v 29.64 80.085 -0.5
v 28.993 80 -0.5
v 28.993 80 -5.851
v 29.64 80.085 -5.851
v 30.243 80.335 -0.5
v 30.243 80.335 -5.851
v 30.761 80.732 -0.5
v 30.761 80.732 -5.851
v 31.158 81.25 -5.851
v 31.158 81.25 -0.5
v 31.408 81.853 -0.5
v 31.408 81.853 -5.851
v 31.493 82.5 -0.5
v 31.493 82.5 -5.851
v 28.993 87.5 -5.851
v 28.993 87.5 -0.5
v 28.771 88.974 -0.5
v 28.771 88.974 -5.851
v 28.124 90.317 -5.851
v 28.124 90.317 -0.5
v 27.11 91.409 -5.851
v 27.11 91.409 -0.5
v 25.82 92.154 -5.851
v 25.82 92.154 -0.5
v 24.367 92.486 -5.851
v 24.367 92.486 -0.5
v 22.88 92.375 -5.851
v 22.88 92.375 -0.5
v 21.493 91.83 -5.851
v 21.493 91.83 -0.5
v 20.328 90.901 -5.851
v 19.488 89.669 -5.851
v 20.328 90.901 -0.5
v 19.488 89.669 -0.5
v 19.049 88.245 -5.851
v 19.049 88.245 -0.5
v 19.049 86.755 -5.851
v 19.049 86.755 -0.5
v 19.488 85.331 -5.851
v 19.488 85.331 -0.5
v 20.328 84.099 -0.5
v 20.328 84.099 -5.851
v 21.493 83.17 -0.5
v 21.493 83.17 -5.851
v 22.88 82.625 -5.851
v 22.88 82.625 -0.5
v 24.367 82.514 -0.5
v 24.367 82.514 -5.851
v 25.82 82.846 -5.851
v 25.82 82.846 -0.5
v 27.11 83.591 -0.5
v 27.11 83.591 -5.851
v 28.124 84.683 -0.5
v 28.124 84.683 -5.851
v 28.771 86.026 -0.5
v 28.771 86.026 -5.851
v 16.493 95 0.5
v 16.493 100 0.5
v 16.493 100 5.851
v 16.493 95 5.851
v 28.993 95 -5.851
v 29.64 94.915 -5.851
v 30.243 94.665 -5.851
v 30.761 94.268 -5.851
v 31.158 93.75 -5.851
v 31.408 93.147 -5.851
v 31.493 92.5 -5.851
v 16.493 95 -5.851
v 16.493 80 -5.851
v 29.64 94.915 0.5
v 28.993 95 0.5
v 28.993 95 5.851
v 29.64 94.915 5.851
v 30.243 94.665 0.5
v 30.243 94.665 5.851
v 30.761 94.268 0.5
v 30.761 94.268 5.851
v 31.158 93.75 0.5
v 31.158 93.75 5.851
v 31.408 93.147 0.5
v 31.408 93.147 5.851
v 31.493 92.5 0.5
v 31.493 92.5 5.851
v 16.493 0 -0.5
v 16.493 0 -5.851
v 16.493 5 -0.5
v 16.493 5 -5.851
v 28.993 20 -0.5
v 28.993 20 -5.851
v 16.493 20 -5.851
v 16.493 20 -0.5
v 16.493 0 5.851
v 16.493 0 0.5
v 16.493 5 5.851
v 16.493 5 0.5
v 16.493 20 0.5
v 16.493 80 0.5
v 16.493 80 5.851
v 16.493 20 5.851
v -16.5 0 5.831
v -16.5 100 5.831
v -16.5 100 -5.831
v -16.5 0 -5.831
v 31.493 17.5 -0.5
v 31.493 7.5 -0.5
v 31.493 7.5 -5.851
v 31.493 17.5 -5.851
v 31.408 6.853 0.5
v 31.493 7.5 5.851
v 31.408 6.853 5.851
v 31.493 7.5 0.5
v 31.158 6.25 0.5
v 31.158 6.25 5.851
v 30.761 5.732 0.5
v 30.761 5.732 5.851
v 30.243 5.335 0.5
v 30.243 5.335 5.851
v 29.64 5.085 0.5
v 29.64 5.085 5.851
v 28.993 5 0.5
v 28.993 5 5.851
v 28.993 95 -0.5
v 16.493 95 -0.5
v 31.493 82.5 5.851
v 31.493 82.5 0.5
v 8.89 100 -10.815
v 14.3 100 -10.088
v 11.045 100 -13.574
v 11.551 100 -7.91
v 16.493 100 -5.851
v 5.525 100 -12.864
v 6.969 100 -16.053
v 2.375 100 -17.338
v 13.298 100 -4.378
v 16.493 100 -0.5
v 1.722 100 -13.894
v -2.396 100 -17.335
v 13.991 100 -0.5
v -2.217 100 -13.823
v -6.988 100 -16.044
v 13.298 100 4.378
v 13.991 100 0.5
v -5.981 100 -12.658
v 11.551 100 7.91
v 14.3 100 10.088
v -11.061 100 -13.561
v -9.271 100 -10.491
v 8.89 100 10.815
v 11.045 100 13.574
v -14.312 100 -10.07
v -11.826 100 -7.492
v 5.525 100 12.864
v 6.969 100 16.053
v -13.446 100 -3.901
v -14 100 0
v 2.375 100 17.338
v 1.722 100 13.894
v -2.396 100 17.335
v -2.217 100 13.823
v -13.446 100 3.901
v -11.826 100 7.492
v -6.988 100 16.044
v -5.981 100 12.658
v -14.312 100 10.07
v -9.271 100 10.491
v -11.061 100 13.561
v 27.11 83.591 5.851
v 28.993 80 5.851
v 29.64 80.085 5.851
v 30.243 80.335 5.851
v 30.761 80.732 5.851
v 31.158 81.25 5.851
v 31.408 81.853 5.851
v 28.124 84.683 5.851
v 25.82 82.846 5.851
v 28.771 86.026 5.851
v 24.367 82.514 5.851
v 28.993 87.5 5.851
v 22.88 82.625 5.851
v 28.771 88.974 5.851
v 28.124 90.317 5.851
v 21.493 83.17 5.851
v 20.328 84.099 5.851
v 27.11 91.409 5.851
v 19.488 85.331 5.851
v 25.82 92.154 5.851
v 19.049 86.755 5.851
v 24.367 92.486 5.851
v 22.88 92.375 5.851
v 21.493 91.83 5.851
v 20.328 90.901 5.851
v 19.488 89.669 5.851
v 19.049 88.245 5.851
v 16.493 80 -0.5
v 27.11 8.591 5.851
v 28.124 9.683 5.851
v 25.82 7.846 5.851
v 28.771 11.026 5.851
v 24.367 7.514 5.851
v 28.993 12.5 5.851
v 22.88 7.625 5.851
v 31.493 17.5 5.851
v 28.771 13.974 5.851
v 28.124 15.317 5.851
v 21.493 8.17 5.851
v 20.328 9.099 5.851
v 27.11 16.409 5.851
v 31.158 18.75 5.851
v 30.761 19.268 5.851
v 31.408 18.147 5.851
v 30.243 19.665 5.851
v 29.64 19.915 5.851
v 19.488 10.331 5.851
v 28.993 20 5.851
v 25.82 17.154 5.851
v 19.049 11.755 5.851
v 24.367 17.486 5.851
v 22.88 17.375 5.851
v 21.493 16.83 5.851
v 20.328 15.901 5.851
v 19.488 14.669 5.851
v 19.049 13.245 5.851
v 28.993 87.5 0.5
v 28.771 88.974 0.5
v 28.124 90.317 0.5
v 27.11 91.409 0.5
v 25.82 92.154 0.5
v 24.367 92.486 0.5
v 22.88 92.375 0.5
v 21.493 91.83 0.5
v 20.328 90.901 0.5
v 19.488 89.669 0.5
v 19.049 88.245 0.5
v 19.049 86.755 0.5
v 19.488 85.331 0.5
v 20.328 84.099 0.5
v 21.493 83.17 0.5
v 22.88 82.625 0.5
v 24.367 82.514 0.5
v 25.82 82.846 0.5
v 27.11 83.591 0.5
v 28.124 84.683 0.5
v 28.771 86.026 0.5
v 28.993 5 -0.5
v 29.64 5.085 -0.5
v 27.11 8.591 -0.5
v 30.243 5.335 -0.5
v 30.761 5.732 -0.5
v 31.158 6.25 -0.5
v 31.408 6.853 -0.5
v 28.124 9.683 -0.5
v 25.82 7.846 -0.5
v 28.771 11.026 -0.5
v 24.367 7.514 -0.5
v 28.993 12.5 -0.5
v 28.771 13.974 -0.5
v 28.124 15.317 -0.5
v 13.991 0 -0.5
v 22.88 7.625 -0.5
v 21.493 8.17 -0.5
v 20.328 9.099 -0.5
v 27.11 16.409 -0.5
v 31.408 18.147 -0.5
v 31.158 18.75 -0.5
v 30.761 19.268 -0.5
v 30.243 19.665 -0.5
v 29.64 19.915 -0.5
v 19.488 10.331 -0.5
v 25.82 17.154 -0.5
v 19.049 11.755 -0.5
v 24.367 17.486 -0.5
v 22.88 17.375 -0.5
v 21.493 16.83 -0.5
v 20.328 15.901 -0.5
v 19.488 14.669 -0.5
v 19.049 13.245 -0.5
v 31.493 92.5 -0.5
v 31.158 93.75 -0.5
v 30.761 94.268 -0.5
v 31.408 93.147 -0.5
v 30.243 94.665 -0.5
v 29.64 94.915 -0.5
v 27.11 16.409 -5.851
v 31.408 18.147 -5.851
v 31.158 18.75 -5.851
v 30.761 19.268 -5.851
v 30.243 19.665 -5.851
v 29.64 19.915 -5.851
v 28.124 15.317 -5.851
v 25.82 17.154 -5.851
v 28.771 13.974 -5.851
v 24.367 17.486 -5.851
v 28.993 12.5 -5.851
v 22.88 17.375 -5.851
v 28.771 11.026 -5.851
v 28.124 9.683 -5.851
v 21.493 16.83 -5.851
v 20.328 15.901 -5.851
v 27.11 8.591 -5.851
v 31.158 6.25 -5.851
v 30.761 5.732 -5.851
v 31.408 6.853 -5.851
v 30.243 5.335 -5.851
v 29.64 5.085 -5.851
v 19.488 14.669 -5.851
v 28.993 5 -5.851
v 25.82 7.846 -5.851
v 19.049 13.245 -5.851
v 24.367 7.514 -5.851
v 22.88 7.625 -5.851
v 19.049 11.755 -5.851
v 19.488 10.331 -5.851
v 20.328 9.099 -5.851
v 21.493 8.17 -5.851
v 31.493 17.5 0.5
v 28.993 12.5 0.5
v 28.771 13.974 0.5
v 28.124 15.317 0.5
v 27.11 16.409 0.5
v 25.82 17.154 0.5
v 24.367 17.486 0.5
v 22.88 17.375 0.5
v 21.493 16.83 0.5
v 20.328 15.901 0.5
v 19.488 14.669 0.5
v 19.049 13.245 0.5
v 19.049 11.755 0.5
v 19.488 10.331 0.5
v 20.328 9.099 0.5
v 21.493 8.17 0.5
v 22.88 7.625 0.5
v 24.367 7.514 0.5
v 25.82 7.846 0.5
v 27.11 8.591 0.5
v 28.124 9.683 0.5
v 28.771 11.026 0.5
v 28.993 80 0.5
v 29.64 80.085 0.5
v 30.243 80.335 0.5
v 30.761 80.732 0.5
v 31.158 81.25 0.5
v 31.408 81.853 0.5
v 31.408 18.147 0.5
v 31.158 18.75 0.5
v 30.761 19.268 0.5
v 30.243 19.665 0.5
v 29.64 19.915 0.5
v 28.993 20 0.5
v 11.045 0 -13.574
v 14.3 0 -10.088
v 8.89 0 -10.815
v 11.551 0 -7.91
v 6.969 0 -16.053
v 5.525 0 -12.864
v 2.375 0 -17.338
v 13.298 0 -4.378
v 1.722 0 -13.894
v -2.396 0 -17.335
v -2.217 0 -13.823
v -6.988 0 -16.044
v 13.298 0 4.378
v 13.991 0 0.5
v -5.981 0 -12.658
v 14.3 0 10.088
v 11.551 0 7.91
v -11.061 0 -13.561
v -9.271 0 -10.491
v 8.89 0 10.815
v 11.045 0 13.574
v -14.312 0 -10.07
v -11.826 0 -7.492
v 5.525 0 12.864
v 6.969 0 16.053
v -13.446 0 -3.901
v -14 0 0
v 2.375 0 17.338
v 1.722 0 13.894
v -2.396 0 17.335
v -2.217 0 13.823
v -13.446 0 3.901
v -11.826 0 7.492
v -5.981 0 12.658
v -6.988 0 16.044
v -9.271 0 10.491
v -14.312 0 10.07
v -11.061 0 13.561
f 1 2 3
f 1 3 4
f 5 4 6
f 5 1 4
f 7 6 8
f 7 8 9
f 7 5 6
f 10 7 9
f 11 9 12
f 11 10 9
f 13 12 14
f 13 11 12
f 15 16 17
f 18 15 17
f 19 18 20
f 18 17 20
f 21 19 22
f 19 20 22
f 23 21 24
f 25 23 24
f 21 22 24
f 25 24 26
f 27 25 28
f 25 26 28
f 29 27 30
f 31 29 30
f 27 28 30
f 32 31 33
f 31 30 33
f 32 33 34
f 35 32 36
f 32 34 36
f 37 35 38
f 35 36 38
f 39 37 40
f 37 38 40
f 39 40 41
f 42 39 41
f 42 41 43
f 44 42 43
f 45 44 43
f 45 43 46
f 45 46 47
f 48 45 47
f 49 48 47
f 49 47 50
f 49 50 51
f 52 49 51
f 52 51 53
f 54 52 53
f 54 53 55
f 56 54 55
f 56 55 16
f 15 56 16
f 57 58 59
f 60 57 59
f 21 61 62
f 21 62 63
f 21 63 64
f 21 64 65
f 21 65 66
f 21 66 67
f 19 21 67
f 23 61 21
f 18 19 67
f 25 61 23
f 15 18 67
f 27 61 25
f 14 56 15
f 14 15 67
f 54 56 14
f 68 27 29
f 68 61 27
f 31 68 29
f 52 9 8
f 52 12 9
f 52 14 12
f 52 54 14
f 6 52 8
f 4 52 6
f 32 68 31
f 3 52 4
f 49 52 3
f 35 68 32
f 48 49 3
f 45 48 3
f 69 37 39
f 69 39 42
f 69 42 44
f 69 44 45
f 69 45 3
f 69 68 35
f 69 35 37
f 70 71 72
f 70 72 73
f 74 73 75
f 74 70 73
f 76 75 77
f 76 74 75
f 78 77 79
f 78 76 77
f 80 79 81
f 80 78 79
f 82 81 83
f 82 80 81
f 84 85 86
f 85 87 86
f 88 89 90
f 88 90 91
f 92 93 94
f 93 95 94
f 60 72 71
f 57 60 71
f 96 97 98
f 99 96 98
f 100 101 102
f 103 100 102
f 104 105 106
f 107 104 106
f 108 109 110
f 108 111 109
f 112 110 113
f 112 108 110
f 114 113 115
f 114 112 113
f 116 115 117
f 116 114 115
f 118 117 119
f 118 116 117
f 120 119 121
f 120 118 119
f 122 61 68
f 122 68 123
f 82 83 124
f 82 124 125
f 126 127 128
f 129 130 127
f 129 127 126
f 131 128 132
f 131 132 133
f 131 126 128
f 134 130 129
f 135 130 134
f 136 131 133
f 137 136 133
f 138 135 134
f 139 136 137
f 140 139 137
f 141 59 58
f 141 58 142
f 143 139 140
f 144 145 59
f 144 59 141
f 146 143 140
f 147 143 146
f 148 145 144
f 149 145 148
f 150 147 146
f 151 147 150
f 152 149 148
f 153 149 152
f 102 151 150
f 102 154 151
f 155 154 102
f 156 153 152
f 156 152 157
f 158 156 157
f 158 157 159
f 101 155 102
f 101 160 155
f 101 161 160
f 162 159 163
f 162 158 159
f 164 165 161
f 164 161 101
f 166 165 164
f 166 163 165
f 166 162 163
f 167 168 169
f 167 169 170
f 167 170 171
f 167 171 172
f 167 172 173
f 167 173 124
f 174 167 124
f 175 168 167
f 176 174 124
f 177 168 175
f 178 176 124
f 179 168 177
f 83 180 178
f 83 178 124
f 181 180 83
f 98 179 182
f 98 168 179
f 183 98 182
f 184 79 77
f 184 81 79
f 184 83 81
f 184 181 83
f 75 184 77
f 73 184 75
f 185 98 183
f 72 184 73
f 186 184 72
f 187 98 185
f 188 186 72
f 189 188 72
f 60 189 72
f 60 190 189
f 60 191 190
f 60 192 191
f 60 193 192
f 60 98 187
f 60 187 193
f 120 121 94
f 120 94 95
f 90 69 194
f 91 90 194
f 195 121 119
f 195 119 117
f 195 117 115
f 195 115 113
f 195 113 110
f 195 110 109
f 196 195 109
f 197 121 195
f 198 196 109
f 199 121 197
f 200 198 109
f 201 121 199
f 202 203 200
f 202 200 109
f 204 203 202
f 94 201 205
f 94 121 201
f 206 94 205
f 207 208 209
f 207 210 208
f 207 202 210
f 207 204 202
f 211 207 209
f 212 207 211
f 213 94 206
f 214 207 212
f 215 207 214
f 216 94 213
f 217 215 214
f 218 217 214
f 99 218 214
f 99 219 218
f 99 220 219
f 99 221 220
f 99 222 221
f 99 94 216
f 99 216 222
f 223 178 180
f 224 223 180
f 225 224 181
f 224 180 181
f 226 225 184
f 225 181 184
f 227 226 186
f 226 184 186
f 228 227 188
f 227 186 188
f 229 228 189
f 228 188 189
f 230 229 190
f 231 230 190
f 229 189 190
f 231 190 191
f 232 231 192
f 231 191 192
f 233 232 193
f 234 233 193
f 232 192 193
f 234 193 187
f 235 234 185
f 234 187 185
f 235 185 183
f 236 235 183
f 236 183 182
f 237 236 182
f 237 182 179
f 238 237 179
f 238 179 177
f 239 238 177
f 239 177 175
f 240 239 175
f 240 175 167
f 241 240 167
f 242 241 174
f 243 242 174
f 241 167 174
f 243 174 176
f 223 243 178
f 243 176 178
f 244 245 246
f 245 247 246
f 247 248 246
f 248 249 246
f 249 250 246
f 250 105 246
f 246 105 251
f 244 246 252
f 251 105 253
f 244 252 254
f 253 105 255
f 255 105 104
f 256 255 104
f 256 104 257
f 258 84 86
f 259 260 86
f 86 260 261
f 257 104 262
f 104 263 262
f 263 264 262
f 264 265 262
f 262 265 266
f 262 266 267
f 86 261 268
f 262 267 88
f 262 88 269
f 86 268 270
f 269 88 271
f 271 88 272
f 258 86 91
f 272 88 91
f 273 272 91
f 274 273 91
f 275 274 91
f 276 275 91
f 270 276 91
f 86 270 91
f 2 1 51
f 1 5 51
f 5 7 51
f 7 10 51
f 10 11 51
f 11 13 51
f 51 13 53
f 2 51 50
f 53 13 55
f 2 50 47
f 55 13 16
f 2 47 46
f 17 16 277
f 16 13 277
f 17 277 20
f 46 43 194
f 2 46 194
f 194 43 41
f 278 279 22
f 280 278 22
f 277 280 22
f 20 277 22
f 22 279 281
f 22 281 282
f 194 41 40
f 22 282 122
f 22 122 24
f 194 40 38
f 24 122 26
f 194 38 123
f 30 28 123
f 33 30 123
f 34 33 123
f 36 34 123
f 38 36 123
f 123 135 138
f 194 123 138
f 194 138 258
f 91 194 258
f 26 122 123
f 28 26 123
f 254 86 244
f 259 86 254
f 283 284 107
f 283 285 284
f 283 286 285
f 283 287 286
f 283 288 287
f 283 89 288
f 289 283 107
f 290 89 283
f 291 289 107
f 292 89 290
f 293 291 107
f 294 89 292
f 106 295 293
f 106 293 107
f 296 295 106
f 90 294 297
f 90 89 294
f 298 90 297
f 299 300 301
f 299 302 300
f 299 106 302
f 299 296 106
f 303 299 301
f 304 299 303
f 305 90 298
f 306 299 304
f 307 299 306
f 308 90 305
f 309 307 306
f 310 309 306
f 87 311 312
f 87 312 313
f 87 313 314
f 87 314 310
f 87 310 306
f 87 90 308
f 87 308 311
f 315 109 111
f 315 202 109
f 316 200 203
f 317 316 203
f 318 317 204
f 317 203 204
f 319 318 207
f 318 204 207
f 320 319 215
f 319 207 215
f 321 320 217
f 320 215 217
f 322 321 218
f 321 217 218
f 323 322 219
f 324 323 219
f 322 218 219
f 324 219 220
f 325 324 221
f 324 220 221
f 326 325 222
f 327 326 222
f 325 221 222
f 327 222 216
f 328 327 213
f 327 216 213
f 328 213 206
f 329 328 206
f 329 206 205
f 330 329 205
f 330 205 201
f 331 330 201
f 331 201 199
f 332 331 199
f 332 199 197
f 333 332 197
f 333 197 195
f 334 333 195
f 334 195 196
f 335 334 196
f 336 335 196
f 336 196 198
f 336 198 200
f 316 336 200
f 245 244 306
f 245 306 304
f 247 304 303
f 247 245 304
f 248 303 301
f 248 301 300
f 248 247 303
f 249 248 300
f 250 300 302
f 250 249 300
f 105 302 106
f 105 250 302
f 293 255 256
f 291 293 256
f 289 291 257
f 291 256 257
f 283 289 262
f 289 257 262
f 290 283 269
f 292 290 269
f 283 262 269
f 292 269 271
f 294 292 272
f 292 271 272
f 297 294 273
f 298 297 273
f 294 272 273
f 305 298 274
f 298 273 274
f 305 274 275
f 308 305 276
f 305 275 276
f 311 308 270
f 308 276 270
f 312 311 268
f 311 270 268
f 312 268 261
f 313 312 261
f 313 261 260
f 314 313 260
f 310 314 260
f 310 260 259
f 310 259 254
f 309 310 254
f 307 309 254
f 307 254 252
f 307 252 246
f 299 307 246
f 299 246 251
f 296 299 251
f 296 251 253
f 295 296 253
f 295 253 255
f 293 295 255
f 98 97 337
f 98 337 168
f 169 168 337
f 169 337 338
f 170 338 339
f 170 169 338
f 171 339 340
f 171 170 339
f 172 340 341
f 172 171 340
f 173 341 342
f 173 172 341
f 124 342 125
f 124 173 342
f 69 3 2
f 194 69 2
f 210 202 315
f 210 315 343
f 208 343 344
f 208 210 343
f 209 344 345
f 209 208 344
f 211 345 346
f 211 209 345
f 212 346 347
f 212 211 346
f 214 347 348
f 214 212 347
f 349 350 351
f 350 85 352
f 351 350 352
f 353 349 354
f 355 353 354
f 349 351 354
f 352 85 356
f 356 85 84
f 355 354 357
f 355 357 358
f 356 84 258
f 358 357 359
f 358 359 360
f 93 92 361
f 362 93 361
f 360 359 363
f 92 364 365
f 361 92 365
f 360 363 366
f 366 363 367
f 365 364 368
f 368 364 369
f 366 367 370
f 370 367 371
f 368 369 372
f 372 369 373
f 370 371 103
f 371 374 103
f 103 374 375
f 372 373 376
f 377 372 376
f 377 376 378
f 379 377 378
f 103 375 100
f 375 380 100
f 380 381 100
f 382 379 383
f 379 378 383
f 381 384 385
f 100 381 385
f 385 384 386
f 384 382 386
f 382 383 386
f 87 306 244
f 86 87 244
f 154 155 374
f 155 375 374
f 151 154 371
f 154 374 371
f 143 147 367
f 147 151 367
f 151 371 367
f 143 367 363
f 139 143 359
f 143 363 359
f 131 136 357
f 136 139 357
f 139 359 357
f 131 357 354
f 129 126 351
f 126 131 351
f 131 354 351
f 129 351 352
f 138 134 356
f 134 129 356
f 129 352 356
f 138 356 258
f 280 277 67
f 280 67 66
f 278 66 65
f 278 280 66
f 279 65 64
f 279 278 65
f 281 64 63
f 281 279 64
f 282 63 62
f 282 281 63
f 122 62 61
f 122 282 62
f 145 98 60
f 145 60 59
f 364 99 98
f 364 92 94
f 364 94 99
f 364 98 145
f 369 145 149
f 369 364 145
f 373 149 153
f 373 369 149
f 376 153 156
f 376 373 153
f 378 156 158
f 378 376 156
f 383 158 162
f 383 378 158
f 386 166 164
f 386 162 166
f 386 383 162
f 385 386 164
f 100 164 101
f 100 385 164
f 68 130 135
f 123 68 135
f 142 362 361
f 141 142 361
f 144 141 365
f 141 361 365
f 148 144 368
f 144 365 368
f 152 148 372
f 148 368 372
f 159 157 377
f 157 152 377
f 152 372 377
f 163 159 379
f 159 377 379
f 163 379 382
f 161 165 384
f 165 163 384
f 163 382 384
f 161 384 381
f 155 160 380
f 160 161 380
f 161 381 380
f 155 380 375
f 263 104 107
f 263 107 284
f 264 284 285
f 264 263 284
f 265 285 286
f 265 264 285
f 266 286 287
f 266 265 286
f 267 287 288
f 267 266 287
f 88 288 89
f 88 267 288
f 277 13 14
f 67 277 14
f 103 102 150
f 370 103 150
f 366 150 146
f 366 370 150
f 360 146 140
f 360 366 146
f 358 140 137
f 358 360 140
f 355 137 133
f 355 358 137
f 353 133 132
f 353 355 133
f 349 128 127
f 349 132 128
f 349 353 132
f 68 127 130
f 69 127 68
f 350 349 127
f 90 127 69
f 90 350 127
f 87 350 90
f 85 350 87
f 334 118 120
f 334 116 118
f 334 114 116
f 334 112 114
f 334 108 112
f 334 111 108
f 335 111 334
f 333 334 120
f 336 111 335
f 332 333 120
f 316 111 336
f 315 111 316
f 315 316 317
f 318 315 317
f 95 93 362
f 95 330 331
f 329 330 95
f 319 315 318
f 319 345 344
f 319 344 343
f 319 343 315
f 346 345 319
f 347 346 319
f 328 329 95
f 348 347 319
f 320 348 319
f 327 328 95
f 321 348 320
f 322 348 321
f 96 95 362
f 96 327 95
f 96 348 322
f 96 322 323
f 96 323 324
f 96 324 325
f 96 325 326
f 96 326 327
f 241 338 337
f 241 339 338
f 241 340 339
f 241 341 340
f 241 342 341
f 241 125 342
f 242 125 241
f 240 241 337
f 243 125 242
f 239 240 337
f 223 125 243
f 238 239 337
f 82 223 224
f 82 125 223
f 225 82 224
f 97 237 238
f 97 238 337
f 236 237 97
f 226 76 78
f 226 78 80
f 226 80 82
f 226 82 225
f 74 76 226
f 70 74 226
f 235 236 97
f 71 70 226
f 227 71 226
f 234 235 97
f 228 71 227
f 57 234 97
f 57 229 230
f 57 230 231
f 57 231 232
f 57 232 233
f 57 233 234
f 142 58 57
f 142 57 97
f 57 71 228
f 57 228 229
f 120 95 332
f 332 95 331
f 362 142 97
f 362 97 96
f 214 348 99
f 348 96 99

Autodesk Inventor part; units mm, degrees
ref_plane "YZ Plane" through (0, 0, 0) normal (1, 0, 0) x (0, 1, 0)
ref_plane "XZ Plane" through (0, 0, 0) normal (0, 1, 0) x (-1, 0, 0)
ref_plane "XY Plane" through (0, 0, 0) normal (0, 0, 1) x (1, 0, 0)
sketch "Skizze1" plane through (0, 0, 0) normal (0, 1, 0) x (-1, 0, 0)
  circle A0 centre (0, 0) radius 14
  circle A1 centre (0, 0) radius 17.5
  dimension "d0" = 28
  dimension "d1" = 35
extrude "Extrusion1" add sketch "Skizze1" along normal blind 100
sketch "Skizze2" plane through (0, 100, 0) normal (0, 1, 0) x (1, 0, 0)
  circle A0 centre (0, 0) radius 17.5 construction
  line L0 (-17.5, 0) -> (17.5, 0) construction
  line L1 (0, -17.5) -> (0, 17.5) construction
  line L2 (11.1238, 0) -> (19.1238, 0)
  line L3 (19.1238, 0) -> (19.1238, 0.5)
  line L4 (19.1238, 0.5) -> (11.1238, 0.5)
  line L5 (11.1238, 0.5) -> (11.1238, 0)
  line L6 (11.1238, 0) -> (19.1238, 0)
  line L7 (19.1238, 0) -> (19.1238, -0.5)
  line L8 (19.1238, -0.5) -> (11.1238, -0.5)
  line L9 (11.1238, -0.5) -> (11.1238, 0)
  dimension "d4" = 8
  dimension "d5" = 0.5
  dimension "d6" = 0.5
extrude "Extrusion2" cut sketch "Skizze2" against normal blind 1000
sketch "Skizze3" plane through (0, 100, 0) normal (0, 1, 0) x (1, 0, 0)
  arc A0 (17.4929, 0.5) -> (17.4929, -0.5) centre (0, 0) ccw construction
  line L0 (-17.5, 0) -> (17.4929, 0) construction
  line L1 (-17.5, 0) -> (-16.5, 0)
  line L2 (-16.5, 0) -> (-16.5, 10)
  line L3 (-16.5, 10) -> (-17.5, 10)
  line L4 (-17.5, 10) -> (-17.5, 0)
  line L5 (-17.5, 0) -> (-16.5, 0)
  line L6 (-16.5, 0) -> (-16.5, -14.1837)
  line L7 (-16.5, -14.1837) -> (-17.5, -14.1837)
  line L8 (-17.5, -14.1837) -> (-17.5, 0)
  line L9 (-0.0036, -17.5) -> (-0.0036, 17.5) construction
  line L10 (17.4929, 0) -> (16.4929, 0)
  line L11 (16.4929, 0) -> (16.4929, 10)
  line L12 (16.4929, 10) -> (17.4929, 10)
  line L13 (17.4929, 10) -> (17.4929, 0)
  line L14 (17.4929, 0) -> (16.4929, 0)
  line L15 (16.4929, 0) -> (16.4929, -14.1837)
  line L16 (16.4929, -14.1837) -> (17.4929, -14.1837)
  line L17 (17.4929, -14.1837) -> (17.4929, 0)
  dimension "d9" = 1
  dimension "d10" = 10
extrude "Extrusion3" cut sketch "Skizze3" against normal blind 1000
sketch "Skizze4" plane through (16.4929, 100, 5.8511) normal (1, 0, 0) x (0, 0, -1)
  line L0 (0, -100) -> (0, 0) projected
  line L1 (5.3511, 0) -> (0, 0)
  line L2 (0, 0) -> (0, -5)
  line L3 (0, -5) -> (5.3511, -5)
  line L4 (5.3511, -5) -> (5.3511, 0)
  line L5 (0, -5) -> (5.3511, -5)
  line L6 (5.3511, -5) -> (5.3511, -20)
  line L7 (5.3511, -20) -> (0, -20)
  line L8 (0, -20) -> (0, -5)
  line L9 (11.7023, 0) -> (11.7023, -100) projected
  line L10 (6.3511, 0) -> (11.7023, 0)
  line L11 (11.7023, 0) -> (11.7023, -5)
  line L12 (11.7023, -5) -> (6.3511, -5)
  line L13 (6.3511, -5) -> (6.3511, 0)
  line L14 (6.3511, -5) -> (11.7023, -5)
  line L15 (11.7023, -5) -> (11.7023, -20)
  line L16 (11.7023, -20) -> (6.3511, -20)
  line L17 (6.3511, -20) -> (6.3511, -5)
  line L18 (0, -50) -> (11.7023, -50) construction
  line L19 (5.3511, -100) -> (0, -100)
  line L20 (0, -100) -> (0, -95)
  line L21 (0, -95) -> (5.3511, -95)
  line L22 (5.3511, -95) -> (5.3511, -100)
  line L23 (0, -95) -> (5.3511, -95)
  line L24 (5.3511, -95) -> (5.3511, -80)
  line L25 (5.3511, -80) -> (0, -80)
  line L26 (0, -80) -> (0, -95)
  line L27 (6.3511, -100) -> (11.7023, -100)
  line L28 (11.7023, -100) -> (11.7023, -95)
  line L29 (11.7023, -95) -> (6.3511, -95)
  line L30 (6.3511, -95) -> (6.3511, -100)
  line L31 (6.3511, -95) -> (11.7023, -95)
  line L32 (11.7023, -95) -> (11.7023, -80)
  line L33 (11.7023, -80) -> (6.3511, -80)
  line L34 (6.3511, -80) -> (6.3511, -95)
  point P0 (5.8511, -100)
  point P1 (11.7023, -80)
  point P2 (0, -80)
  dimension "d13" = 5
  dimension "d14" = 15
  dimension "d15" = 15
extrude "Extrusion4" add sketch "Skizze4" along normal blind 15 contours L0 L3 L6 L7 | L0 L25 L24 L21 | L9 L29 L34 L33 | L9 L16 L17 L12
fillet "Rundung1" radius 2.5 8 edges at (31.4929, 95, 3.1756) (31.4929, 80, 3.1756) (31.4929, 80, -3.1756) (31.4929, 95, -3.1756) (31.4929, 20, 3.1756) (31.4929, 5, 3.1756) (31.4929, 20, -3.1756) (31.4929, 5, -3.1756)
sketch "Skizze5" plane through (16.4929, 80, 5.8511) normal (0, 0, 1) x (1, 0, 0)
  line L0 (0, 0) -> (12.5, 0) construction
  line L1 (0, 0) -> (7.5, 0) construction
  line L2 (0, 0) -> (7.5, 0) construction
  line L3 (7.5, 0) -> (7.5, 7.5) construction
  circle A0 centre (7.5, 7.5) radius 5
  line L4 (0, -75) -> (12.5, -75) construction
  line L5 (0, -75) -> (7.5, -75) construction
  line L6 (0, -75) -> (7.5, -75) construction
  line L7 (7.5, -75) -> (7.5, -67.5) construction
  circle A1 centre (7.5, -67.5) radius 5
  point P0 (-16.4929, -80)
  dimension "d19" = 7.5
  dimension "d20" = 0
  dimension "d21" = 7.5
  dimension "d22" = 90
  dimension "d23" = 10
  dimension "d24" = 7.5
  dimension "d25" = 0
  dimension "d26" = 7.5
  dimension "d27" = 90
  dimension "d28" = 10
extrude "Extrusion5" cut sketch "Skizze5" against normal blind 100
properties part number "Hülse"
